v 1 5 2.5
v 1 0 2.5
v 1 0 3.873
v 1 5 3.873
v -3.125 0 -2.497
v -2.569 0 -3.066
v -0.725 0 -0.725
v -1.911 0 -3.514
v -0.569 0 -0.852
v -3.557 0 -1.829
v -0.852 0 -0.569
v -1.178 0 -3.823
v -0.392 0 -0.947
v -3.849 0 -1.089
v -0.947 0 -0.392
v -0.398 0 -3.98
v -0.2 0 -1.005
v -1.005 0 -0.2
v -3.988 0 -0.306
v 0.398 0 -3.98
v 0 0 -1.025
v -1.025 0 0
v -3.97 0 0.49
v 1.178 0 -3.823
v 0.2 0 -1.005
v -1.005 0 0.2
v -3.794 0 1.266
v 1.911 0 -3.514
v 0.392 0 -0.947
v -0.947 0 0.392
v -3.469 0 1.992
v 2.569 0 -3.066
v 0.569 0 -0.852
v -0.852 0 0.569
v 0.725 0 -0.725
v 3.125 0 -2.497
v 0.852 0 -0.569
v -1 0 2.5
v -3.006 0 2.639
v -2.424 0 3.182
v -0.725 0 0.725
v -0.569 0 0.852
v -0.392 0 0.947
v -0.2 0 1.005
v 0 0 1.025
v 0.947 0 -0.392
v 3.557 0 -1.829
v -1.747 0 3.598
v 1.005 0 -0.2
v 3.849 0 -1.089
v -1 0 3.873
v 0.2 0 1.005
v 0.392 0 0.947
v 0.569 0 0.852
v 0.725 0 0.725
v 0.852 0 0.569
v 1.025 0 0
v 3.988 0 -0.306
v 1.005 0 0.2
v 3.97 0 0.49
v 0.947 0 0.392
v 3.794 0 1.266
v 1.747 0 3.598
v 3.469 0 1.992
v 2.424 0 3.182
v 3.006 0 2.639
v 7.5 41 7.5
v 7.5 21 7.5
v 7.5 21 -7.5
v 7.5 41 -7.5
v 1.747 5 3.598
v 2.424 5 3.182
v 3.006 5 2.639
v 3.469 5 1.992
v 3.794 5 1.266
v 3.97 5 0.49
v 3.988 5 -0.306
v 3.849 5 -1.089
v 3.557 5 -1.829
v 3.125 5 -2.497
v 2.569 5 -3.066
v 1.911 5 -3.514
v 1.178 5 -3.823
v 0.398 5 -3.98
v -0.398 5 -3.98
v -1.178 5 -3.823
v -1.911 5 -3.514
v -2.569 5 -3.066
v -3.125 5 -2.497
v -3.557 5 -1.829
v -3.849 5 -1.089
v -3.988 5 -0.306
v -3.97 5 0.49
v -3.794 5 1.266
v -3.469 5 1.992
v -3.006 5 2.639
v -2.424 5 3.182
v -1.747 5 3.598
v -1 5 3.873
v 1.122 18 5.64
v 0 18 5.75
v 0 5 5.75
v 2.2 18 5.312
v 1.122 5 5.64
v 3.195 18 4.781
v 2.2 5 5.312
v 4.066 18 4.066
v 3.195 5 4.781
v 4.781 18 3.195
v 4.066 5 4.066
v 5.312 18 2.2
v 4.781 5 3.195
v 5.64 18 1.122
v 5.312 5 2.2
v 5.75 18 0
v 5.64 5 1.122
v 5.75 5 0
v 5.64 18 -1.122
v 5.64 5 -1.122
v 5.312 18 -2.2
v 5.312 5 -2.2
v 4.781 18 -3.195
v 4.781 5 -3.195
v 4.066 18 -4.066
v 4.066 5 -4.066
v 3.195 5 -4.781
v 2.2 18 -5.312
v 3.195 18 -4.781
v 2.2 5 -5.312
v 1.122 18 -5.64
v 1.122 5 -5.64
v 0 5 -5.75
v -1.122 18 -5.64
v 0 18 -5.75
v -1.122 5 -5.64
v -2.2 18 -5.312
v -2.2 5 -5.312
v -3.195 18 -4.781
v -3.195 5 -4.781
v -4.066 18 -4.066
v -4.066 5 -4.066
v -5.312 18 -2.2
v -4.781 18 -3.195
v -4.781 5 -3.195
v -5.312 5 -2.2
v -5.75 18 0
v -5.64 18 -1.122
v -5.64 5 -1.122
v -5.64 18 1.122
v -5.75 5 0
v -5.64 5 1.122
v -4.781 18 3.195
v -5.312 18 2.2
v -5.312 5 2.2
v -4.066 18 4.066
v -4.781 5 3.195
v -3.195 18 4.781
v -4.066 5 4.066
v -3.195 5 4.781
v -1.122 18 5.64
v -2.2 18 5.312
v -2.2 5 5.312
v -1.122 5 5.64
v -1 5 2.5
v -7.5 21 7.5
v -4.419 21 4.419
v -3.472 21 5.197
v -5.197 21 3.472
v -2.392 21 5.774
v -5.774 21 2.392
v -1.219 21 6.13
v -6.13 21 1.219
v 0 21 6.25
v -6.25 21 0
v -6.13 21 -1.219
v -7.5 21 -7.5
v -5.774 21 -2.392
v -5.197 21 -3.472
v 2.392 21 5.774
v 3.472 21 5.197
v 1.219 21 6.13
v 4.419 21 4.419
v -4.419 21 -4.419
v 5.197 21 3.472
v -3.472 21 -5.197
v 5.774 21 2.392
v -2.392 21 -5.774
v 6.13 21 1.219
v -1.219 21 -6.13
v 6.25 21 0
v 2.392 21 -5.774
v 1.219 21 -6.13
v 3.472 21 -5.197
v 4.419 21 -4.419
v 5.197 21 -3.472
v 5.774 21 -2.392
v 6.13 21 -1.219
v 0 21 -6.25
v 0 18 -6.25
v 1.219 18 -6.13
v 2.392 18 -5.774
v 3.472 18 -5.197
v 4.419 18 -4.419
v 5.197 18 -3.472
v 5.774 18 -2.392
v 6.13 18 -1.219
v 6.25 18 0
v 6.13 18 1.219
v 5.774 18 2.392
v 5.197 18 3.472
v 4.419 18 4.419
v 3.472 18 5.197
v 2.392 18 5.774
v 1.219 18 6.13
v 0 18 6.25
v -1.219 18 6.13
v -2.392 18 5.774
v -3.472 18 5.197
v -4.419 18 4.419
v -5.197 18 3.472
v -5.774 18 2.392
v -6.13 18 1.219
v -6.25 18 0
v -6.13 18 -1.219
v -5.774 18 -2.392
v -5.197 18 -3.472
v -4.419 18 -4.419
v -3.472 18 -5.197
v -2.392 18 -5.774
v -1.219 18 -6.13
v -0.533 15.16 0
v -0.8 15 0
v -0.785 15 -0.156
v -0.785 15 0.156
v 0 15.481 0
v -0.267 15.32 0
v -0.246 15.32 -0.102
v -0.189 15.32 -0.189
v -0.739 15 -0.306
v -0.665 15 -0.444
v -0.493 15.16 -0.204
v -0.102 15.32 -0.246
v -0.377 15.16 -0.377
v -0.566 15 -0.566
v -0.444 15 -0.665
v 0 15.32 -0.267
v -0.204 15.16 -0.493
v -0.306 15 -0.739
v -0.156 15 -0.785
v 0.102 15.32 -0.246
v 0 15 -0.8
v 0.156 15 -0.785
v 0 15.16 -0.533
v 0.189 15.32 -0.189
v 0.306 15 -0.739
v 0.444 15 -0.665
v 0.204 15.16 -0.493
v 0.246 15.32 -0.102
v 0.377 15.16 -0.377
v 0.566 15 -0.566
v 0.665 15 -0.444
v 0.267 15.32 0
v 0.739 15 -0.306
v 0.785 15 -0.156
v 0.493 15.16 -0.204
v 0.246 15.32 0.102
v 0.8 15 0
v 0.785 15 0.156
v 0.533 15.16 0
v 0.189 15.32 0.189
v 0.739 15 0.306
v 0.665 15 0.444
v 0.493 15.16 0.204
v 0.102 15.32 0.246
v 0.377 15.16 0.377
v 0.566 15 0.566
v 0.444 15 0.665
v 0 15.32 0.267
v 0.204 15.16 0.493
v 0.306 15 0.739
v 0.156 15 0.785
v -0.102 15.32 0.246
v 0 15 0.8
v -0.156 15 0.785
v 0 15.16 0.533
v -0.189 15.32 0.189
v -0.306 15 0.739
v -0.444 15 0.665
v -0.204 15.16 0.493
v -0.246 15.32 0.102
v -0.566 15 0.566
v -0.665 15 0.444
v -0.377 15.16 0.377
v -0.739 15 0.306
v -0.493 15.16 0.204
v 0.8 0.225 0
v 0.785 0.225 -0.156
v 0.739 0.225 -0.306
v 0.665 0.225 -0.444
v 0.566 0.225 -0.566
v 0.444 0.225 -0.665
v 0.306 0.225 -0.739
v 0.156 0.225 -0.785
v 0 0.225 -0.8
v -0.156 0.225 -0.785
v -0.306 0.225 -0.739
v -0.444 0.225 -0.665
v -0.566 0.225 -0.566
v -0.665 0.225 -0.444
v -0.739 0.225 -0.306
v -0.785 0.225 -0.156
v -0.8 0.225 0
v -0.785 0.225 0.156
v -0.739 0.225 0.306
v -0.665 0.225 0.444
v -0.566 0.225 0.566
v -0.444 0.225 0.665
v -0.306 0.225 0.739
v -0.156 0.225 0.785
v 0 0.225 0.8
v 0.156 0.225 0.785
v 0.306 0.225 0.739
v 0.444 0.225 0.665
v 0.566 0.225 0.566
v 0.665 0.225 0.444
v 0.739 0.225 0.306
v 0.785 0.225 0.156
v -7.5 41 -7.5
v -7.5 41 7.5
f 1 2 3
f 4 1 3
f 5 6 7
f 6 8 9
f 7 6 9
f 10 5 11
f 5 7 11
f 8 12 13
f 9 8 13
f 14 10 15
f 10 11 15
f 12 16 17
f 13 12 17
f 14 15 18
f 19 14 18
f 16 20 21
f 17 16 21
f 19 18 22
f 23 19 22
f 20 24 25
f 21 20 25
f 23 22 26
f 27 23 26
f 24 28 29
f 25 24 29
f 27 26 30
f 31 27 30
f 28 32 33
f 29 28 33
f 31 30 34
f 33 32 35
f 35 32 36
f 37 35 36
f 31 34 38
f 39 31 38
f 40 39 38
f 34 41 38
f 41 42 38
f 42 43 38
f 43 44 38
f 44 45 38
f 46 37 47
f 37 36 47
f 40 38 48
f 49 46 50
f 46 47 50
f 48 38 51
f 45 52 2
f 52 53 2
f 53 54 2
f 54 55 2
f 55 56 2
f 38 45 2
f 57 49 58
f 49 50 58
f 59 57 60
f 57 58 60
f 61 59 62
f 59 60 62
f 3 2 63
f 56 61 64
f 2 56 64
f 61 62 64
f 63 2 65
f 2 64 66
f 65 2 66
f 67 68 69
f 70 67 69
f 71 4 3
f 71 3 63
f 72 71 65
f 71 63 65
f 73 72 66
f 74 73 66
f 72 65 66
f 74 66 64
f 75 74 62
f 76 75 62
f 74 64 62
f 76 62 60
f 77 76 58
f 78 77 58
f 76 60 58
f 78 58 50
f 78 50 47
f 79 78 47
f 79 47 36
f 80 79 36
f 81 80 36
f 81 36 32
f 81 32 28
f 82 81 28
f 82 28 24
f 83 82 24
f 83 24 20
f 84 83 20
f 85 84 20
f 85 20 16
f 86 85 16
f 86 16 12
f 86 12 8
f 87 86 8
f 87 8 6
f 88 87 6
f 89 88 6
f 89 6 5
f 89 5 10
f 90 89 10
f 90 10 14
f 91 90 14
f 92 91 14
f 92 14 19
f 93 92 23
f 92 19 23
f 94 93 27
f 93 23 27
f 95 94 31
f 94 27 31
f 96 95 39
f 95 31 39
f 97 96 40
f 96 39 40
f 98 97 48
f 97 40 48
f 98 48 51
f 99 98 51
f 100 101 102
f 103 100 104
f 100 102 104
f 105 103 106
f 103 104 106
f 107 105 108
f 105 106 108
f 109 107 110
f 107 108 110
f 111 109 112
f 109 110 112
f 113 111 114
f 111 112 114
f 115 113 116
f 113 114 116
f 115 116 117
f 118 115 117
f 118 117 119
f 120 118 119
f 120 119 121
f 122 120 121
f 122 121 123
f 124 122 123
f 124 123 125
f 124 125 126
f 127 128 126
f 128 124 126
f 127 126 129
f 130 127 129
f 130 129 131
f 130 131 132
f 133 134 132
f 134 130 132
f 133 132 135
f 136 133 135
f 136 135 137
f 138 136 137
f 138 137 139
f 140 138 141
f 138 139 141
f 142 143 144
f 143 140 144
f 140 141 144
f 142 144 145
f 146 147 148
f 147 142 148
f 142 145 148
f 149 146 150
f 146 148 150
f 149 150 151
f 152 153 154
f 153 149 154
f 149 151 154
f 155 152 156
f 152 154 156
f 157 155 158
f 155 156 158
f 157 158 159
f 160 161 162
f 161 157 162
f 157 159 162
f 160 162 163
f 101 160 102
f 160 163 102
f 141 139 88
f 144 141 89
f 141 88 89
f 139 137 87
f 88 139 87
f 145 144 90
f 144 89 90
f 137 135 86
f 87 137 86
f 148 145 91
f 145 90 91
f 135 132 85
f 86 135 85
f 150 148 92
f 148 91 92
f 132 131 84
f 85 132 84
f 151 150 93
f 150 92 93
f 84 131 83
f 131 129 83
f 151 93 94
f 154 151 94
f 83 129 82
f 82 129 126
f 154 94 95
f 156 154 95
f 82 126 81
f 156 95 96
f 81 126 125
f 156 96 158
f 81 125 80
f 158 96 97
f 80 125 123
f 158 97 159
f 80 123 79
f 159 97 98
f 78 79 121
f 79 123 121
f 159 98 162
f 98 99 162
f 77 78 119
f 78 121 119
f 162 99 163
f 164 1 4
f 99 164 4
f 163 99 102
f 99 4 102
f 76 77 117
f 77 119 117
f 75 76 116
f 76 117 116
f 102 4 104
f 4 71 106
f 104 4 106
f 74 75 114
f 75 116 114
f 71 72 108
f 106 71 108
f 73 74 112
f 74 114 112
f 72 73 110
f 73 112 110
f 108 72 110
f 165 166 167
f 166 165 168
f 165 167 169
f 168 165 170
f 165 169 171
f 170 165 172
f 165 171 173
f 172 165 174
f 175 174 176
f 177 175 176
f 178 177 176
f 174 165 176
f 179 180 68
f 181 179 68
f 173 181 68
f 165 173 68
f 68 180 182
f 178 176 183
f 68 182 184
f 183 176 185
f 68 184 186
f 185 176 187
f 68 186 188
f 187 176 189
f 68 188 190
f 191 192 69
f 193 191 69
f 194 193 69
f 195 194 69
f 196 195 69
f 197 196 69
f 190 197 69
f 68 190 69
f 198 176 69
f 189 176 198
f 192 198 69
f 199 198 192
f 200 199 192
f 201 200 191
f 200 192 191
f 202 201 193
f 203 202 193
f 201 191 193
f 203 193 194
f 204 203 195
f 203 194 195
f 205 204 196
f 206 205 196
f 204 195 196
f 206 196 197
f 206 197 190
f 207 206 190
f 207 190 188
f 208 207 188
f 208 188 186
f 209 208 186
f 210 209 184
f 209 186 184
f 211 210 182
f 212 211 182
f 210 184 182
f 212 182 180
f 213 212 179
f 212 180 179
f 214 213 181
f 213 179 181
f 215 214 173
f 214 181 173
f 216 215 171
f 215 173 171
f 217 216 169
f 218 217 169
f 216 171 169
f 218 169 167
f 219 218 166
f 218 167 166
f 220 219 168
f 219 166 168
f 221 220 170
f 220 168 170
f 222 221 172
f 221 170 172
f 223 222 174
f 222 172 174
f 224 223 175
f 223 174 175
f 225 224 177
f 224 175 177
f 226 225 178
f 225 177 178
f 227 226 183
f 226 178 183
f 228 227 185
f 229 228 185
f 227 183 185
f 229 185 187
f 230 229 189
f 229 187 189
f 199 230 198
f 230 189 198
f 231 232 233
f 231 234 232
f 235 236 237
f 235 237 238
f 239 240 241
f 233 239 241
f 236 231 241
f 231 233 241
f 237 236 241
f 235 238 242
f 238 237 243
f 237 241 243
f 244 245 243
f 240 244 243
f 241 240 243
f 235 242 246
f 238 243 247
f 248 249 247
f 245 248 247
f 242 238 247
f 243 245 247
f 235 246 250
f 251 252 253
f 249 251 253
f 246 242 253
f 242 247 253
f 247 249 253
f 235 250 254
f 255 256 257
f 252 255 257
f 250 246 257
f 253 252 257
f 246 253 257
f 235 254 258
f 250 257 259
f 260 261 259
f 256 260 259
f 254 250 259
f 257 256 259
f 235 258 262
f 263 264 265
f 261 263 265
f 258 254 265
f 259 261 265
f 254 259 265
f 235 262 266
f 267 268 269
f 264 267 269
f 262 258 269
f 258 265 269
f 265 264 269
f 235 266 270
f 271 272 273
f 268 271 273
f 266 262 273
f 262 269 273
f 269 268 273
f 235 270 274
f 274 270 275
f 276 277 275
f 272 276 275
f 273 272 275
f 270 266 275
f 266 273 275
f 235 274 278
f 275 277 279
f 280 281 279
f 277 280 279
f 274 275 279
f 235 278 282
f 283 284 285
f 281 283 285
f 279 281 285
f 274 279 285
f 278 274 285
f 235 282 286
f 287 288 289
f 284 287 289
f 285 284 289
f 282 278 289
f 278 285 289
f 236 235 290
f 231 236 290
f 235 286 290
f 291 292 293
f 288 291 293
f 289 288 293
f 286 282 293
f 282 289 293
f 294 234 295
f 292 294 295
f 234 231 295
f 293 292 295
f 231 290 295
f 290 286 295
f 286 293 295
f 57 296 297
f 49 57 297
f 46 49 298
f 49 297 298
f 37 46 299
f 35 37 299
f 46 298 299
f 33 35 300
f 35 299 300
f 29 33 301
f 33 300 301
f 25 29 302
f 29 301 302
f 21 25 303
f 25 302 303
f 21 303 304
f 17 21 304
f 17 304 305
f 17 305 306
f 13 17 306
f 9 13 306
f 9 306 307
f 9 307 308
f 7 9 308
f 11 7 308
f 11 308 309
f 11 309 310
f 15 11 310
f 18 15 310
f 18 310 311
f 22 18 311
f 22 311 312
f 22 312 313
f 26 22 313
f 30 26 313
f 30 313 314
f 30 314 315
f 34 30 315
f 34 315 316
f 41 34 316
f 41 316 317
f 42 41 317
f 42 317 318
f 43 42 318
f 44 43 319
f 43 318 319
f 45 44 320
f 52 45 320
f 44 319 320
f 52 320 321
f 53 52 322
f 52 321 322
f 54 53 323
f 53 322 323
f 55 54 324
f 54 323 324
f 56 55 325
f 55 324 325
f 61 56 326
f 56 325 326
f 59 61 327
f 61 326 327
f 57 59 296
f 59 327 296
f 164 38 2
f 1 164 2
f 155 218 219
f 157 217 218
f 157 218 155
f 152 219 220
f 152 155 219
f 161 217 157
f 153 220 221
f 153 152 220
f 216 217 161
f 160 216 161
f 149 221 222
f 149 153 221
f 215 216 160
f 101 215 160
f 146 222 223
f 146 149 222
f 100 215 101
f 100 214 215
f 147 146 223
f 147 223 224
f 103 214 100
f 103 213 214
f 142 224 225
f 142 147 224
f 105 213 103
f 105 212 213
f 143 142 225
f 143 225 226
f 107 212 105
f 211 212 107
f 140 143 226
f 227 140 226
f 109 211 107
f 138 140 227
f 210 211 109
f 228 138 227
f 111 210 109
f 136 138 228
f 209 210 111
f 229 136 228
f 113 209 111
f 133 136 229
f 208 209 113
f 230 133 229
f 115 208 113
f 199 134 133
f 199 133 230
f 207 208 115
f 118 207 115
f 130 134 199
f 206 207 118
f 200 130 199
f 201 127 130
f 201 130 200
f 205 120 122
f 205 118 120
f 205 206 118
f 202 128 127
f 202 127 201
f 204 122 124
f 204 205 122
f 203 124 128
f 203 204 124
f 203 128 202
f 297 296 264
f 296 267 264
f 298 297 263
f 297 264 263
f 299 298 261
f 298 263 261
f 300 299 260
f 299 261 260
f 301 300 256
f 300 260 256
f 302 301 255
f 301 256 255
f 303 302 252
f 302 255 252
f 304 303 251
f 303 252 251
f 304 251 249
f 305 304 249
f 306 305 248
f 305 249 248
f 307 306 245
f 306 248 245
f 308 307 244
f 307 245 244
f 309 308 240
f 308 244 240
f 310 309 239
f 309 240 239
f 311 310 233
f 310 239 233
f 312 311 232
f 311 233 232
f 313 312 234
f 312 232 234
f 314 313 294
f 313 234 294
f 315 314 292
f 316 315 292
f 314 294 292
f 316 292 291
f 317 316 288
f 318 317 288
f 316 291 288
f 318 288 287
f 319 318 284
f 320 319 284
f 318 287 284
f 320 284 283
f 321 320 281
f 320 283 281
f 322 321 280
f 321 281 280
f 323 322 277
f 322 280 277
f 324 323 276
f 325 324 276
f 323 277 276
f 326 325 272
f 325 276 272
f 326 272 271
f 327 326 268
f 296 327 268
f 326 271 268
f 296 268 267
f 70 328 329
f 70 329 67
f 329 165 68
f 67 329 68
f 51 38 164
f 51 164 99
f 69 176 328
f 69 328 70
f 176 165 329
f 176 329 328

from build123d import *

# Parameters (mm, degrees)
SKETCH2_R                       = 4
BOSS_EXTRUDE1_DEPTH             = 5
SKETCH3_R                       = 5.75
BOSS_EXTRUDE2_DEPTH             = 16
SKETCH4_W                       = 15
SKETCH4_H                       = 15
BOSS_EXTRUDE3_DEPTH             = 20
M2X0_4_TAPPED_HOLE1_D           = 1.6
M2X0_4_TAPPED_HOLE1_DEPTH       = 15
M2X0_4_TAPPED_HOLE1_CSINK_D     = 2.05
M2X0_4_TAPPED_HOLE1_CSINK_ANGLE = 90
M2X0_4_TAPPED_HOLE1_TIP         = 0.480688495
SKETCH10_R                      = 6.25
BOSS_EXTRUDE4_DEPTH             = 3
SKETCH11_W                      = 2
SKETCH11_H                      = 3
CUT_EXTRUDE2_DEPTH              = 5


with BuildPart() as part:
    # Sketch2 → Boss-Extrude1 (new body)
    with BuildSketch(Plane(origin=(0, 0, 0), x_dir=(1, 0, 0), z_dir=(0, 1, 0))):
        with Locations(Location((0, 0, 0), (0, 0, 270))):
            Circle(SKETCH2_R)
    extrude(amount=BOSS_EXTRUDE1_DEPTH)

    # Sketch3 → Boss-Extrude2 (add)
    with BuildSketch(Plane(origin=(0, 5, 0), x_dir=(1, 0, 0), z_dir=(0, 1, 0))):
        with Locations(Location((0, 0, 0), (0, 0, 270))):
            Circle(SKETCH3_R)
    extrude(amount=BOSS_EXTRUDE2_DEPTH)

    # Sketch4 → Boss-Extrude3 (add)
    with BuildSketch(Plane(origin=(0, 21, 0), x_dir=(1, 0, 0), z_dir=(0, 1, 0))):
        Rectangle(SKETCH4_W, SKETCH4_H)
    extrude(amount=BOSS_EXTRUDE3_DEPTH)

    # M2x0.4 Tapped Hole1
    with Locations(Plane(origin=(0, 0, 0), x_dir=(-1, 0, 0), z_dir=(0, -1, 0))):
        with Locations((0, 0)):
            CounterSinkHole(M2X0_4_TAPPED_HOLE1_D / 2, M2X0_4_TAPPED_HOLE1_CSINK_D / 2, depth=M2X0_4_TAPPED_HOLE1_DEPTH, counter_sink_angle=M2X0_4_TAPPED_HOLE1_CSINK_ANGLE)
            with Locations((0, 0, -(M2X0_4_TAPPED_HOLE1_DEPTH + M2X0_4_TAPPED_HOLE1_TIP / 2))):  # 118° drill point
                Cone(0, M2X0_4_TAPPED_HOLE1_D / 2, M2X0_4_TAPPED_HOLE1_TIP, mode=Mode.SUBTRACT)

    # Sketch10 → Boss-Extrude4 (add)
    with BuildSketch(Plane.XZ.offset(-21)):
        with Locations(Location((0, 0, 0), (0, 0, 270))):
            Circle(SKETCH10_R)
    extrude(amount=BOSS_EXTRUDE4_DEPTH)

    # Sketch11 → Cut-Extrude2 (cut)
    with BuildSketch(Plane.XZ):
        with Locations((0, 4)):
            Rectangle(SKETCH11_W, SKETCH11_H)
    extrude(amount=-CUT_EXTRUDE2_DEPTH, mode=Mode.SUBTRACT)


solid = part.part
